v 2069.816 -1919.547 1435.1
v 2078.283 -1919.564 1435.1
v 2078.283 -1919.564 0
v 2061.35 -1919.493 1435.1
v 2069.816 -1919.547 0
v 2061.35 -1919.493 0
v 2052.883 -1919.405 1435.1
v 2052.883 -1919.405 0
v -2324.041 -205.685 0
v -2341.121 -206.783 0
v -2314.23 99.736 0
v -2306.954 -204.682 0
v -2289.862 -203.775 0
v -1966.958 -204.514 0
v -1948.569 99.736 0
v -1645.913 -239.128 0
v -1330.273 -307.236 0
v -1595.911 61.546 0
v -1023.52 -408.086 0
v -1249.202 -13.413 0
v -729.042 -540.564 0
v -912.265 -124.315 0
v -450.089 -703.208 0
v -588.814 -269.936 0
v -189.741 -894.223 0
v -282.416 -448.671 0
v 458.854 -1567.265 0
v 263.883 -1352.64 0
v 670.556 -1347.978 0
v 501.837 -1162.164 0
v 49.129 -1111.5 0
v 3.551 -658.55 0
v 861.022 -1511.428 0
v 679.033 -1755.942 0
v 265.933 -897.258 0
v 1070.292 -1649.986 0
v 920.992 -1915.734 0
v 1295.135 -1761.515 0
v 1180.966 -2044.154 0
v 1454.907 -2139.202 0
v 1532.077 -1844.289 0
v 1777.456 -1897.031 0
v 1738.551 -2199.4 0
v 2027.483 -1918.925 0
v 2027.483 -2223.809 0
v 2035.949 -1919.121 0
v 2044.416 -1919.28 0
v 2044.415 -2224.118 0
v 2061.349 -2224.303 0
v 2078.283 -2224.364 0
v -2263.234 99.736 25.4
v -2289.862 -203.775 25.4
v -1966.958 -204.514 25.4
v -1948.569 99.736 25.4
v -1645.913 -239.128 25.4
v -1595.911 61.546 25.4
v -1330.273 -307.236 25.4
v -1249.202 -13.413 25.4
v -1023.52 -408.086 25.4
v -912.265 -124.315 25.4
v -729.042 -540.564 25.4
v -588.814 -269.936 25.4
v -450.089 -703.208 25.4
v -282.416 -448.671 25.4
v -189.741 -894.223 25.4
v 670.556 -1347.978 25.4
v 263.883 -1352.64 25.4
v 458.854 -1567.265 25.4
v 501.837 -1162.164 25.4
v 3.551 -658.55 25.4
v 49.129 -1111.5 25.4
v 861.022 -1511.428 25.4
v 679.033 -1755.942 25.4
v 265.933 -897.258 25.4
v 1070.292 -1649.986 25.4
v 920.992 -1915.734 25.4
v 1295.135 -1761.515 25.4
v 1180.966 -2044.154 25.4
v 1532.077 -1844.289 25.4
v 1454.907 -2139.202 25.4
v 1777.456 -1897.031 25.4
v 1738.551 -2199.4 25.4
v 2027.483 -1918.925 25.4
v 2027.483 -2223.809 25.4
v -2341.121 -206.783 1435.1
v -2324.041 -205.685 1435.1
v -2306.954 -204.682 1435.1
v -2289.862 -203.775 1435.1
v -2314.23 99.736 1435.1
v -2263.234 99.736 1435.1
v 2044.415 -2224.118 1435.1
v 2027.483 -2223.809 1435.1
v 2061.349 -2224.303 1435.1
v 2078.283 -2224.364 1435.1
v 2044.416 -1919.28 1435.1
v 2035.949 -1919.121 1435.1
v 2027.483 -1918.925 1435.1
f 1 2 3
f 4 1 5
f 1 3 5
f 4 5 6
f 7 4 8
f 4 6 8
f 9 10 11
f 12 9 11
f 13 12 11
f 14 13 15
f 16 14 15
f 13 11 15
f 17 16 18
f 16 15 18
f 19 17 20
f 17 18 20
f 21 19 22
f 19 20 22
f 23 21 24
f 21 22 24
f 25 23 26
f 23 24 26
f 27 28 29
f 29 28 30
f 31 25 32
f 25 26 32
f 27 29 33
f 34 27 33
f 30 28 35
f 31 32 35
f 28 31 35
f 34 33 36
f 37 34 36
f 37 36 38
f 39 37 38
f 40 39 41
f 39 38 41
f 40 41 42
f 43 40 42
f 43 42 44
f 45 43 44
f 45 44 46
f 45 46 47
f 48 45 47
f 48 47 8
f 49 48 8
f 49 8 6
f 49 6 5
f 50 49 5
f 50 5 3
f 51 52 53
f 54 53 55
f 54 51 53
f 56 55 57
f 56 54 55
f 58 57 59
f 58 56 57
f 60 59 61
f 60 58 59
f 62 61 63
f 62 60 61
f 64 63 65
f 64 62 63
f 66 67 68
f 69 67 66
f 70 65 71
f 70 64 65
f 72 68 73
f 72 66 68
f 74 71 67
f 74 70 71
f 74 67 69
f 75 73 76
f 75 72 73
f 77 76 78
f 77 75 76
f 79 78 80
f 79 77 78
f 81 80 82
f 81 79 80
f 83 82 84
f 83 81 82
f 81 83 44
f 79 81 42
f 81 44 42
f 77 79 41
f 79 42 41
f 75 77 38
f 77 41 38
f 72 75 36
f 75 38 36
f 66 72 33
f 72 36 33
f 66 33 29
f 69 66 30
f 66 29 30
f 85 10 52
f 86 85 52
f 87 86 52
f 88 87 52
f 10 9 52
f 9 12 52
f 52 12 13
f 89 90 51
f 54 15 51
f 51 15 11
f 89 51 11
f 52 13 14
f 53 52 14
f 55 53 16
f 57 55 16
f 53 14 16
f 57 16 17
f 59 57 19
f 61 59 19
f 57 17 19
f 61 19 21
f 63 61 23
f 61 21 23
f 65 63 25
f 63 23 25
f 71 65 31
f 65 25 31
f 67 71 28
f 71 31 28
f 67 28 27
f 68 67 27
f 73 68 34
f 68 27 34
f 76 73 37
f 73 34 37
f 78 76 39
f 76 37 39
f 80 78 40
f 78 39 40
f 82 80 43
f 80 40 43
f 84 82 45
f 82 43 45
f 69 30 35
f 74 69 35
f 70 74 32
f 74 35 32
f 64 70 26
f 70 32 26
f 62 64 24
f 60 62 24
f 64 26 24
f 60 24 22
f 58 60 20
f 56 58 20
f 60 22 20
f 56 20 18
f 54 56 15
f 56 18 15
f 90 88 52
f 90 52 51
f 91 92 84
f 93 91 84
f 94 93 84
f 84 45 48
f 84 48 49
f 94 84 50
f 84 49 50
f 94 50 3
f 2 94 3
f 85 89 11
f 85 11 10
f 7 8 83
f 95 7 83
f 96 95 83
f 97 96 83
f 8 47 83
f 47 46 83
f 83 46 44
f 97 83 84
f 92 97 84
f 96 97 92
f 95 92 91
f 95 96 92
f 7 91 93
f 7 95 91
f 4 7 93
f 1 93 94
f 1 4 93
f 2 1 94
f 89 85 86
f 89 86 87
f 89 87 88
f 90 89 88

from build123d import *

# Parameters (mm, degrees)
F1_DEPTH = 25.4
F2_DEPTH = 1435.1
F3_DEPTH = 25.4
F4_DEPTH = 1435.1


with BuildPart() as f1:
    # F0 (on Top) → F1 (new body)
    with BuildSketch(Plane.XY):
        with BuildLine():
            Line((-1948.5691277788, 99.7355101007), (-2263.234400171, 99.7355101007))
            Line((-2263.234400171, 99.7355101007), (-2289.862411819, -203.7745007557))
            ThreePointArc((-2289.862411819, -203.7745007557), (-874.5398284023, -470.4550472357), (263.8832180742, -1352.6395496224))
            ThreePointArc((263.8832180742, -1352.6395496224), (346.7538874408, -1450.5053929427), (434.8963853674, -1543.651360055))
            Line((434.8963853674, -1543.651360055), (650.422532273, -1328.1252131493))
            ThreePointArc((650.422532273, -1328.1252131493), (573.8397062056, -1247.1951105763), (501.8373213462, -1162.1641319538))
            ThreePointArc((501.8373213462, -1162.1641319538), (-588.8138343544, -269.9358016898), (-1948.5691277788, 99.7355101007))
        make_face()
    extrude(amount=F1_DEPTH)

    # F0 (on Top) → F2 (join)
    with BuildSketch(Plane.XY):
        with BuildLine():
            Line((-2263.234400171, 99.7355101007), (-2314.2295336755, 99.7355101007))
            Line((-2314.2295336755, 99.7355101007), (-2341.1214825581, -206.7828963515))
            ThreePointArc((-2341.1214825581, -206.7828963515), (-2315.4982300933, -205.1716461899), (-2289.862411819, -203.7745007557))
            Line((-2289.862411819, -203.7745007557), (-2263.234400171, 99.7355101007))
        make_face()
    extrude(amount=F2_DEPTH)

    # F0 (on Top) → F3 (join)
    with BuildSketch(Plane.XY):
        with BuildLine():
            ThreePointArc((2027.483255523, -1918.925395054), (1282.1233486229, -1755.9858840328), (650.422532273, -1328.1252131493))
            Line((650.422532273, -1328.1252131493), (434.8963853674, -1543.651360055))
            ThreePointArc((434.8963853674, -1543.651360055), (1165.4738720531, -2037.6039199968), (2027.483255523, -2223.8092323134))
            Line((2027.483255523, -2223.8092323134), (2027.483255523, -1918.925395054))
        make_face()
    extrude(amount=F3_DEPTH)

    # F0 (on Top) → F4 (join)
    with BuildSketch(Plane.XY):
        with BuildLine():
            ThreePointArc((2052.883255523, -1919.4047351522), (2040.182501702, -1919.2050097162), (2027.483255523, -1918.925395054))
            Line((2027.483255523, -1918.925395054), (2027.483255523, -2223.8092323134))
            ThreePointArc((2027.483255523, -2223.8092323134), (2052.8817382899, -2224.225671357), (2078.283255523, -2224.3644898993))
            Line((2078.283255523, -2224.3644898993), (2078.283255523, -1919.5644898993))
            ThreePointArc((2078.283255523, -1919.5644898993), (2065.5830043289, -1919.5245508176), (2052.883255523, -1919.4047351522))
        make_face()
    extrude(amount=F4_DEPTH)


solid = f1.part
